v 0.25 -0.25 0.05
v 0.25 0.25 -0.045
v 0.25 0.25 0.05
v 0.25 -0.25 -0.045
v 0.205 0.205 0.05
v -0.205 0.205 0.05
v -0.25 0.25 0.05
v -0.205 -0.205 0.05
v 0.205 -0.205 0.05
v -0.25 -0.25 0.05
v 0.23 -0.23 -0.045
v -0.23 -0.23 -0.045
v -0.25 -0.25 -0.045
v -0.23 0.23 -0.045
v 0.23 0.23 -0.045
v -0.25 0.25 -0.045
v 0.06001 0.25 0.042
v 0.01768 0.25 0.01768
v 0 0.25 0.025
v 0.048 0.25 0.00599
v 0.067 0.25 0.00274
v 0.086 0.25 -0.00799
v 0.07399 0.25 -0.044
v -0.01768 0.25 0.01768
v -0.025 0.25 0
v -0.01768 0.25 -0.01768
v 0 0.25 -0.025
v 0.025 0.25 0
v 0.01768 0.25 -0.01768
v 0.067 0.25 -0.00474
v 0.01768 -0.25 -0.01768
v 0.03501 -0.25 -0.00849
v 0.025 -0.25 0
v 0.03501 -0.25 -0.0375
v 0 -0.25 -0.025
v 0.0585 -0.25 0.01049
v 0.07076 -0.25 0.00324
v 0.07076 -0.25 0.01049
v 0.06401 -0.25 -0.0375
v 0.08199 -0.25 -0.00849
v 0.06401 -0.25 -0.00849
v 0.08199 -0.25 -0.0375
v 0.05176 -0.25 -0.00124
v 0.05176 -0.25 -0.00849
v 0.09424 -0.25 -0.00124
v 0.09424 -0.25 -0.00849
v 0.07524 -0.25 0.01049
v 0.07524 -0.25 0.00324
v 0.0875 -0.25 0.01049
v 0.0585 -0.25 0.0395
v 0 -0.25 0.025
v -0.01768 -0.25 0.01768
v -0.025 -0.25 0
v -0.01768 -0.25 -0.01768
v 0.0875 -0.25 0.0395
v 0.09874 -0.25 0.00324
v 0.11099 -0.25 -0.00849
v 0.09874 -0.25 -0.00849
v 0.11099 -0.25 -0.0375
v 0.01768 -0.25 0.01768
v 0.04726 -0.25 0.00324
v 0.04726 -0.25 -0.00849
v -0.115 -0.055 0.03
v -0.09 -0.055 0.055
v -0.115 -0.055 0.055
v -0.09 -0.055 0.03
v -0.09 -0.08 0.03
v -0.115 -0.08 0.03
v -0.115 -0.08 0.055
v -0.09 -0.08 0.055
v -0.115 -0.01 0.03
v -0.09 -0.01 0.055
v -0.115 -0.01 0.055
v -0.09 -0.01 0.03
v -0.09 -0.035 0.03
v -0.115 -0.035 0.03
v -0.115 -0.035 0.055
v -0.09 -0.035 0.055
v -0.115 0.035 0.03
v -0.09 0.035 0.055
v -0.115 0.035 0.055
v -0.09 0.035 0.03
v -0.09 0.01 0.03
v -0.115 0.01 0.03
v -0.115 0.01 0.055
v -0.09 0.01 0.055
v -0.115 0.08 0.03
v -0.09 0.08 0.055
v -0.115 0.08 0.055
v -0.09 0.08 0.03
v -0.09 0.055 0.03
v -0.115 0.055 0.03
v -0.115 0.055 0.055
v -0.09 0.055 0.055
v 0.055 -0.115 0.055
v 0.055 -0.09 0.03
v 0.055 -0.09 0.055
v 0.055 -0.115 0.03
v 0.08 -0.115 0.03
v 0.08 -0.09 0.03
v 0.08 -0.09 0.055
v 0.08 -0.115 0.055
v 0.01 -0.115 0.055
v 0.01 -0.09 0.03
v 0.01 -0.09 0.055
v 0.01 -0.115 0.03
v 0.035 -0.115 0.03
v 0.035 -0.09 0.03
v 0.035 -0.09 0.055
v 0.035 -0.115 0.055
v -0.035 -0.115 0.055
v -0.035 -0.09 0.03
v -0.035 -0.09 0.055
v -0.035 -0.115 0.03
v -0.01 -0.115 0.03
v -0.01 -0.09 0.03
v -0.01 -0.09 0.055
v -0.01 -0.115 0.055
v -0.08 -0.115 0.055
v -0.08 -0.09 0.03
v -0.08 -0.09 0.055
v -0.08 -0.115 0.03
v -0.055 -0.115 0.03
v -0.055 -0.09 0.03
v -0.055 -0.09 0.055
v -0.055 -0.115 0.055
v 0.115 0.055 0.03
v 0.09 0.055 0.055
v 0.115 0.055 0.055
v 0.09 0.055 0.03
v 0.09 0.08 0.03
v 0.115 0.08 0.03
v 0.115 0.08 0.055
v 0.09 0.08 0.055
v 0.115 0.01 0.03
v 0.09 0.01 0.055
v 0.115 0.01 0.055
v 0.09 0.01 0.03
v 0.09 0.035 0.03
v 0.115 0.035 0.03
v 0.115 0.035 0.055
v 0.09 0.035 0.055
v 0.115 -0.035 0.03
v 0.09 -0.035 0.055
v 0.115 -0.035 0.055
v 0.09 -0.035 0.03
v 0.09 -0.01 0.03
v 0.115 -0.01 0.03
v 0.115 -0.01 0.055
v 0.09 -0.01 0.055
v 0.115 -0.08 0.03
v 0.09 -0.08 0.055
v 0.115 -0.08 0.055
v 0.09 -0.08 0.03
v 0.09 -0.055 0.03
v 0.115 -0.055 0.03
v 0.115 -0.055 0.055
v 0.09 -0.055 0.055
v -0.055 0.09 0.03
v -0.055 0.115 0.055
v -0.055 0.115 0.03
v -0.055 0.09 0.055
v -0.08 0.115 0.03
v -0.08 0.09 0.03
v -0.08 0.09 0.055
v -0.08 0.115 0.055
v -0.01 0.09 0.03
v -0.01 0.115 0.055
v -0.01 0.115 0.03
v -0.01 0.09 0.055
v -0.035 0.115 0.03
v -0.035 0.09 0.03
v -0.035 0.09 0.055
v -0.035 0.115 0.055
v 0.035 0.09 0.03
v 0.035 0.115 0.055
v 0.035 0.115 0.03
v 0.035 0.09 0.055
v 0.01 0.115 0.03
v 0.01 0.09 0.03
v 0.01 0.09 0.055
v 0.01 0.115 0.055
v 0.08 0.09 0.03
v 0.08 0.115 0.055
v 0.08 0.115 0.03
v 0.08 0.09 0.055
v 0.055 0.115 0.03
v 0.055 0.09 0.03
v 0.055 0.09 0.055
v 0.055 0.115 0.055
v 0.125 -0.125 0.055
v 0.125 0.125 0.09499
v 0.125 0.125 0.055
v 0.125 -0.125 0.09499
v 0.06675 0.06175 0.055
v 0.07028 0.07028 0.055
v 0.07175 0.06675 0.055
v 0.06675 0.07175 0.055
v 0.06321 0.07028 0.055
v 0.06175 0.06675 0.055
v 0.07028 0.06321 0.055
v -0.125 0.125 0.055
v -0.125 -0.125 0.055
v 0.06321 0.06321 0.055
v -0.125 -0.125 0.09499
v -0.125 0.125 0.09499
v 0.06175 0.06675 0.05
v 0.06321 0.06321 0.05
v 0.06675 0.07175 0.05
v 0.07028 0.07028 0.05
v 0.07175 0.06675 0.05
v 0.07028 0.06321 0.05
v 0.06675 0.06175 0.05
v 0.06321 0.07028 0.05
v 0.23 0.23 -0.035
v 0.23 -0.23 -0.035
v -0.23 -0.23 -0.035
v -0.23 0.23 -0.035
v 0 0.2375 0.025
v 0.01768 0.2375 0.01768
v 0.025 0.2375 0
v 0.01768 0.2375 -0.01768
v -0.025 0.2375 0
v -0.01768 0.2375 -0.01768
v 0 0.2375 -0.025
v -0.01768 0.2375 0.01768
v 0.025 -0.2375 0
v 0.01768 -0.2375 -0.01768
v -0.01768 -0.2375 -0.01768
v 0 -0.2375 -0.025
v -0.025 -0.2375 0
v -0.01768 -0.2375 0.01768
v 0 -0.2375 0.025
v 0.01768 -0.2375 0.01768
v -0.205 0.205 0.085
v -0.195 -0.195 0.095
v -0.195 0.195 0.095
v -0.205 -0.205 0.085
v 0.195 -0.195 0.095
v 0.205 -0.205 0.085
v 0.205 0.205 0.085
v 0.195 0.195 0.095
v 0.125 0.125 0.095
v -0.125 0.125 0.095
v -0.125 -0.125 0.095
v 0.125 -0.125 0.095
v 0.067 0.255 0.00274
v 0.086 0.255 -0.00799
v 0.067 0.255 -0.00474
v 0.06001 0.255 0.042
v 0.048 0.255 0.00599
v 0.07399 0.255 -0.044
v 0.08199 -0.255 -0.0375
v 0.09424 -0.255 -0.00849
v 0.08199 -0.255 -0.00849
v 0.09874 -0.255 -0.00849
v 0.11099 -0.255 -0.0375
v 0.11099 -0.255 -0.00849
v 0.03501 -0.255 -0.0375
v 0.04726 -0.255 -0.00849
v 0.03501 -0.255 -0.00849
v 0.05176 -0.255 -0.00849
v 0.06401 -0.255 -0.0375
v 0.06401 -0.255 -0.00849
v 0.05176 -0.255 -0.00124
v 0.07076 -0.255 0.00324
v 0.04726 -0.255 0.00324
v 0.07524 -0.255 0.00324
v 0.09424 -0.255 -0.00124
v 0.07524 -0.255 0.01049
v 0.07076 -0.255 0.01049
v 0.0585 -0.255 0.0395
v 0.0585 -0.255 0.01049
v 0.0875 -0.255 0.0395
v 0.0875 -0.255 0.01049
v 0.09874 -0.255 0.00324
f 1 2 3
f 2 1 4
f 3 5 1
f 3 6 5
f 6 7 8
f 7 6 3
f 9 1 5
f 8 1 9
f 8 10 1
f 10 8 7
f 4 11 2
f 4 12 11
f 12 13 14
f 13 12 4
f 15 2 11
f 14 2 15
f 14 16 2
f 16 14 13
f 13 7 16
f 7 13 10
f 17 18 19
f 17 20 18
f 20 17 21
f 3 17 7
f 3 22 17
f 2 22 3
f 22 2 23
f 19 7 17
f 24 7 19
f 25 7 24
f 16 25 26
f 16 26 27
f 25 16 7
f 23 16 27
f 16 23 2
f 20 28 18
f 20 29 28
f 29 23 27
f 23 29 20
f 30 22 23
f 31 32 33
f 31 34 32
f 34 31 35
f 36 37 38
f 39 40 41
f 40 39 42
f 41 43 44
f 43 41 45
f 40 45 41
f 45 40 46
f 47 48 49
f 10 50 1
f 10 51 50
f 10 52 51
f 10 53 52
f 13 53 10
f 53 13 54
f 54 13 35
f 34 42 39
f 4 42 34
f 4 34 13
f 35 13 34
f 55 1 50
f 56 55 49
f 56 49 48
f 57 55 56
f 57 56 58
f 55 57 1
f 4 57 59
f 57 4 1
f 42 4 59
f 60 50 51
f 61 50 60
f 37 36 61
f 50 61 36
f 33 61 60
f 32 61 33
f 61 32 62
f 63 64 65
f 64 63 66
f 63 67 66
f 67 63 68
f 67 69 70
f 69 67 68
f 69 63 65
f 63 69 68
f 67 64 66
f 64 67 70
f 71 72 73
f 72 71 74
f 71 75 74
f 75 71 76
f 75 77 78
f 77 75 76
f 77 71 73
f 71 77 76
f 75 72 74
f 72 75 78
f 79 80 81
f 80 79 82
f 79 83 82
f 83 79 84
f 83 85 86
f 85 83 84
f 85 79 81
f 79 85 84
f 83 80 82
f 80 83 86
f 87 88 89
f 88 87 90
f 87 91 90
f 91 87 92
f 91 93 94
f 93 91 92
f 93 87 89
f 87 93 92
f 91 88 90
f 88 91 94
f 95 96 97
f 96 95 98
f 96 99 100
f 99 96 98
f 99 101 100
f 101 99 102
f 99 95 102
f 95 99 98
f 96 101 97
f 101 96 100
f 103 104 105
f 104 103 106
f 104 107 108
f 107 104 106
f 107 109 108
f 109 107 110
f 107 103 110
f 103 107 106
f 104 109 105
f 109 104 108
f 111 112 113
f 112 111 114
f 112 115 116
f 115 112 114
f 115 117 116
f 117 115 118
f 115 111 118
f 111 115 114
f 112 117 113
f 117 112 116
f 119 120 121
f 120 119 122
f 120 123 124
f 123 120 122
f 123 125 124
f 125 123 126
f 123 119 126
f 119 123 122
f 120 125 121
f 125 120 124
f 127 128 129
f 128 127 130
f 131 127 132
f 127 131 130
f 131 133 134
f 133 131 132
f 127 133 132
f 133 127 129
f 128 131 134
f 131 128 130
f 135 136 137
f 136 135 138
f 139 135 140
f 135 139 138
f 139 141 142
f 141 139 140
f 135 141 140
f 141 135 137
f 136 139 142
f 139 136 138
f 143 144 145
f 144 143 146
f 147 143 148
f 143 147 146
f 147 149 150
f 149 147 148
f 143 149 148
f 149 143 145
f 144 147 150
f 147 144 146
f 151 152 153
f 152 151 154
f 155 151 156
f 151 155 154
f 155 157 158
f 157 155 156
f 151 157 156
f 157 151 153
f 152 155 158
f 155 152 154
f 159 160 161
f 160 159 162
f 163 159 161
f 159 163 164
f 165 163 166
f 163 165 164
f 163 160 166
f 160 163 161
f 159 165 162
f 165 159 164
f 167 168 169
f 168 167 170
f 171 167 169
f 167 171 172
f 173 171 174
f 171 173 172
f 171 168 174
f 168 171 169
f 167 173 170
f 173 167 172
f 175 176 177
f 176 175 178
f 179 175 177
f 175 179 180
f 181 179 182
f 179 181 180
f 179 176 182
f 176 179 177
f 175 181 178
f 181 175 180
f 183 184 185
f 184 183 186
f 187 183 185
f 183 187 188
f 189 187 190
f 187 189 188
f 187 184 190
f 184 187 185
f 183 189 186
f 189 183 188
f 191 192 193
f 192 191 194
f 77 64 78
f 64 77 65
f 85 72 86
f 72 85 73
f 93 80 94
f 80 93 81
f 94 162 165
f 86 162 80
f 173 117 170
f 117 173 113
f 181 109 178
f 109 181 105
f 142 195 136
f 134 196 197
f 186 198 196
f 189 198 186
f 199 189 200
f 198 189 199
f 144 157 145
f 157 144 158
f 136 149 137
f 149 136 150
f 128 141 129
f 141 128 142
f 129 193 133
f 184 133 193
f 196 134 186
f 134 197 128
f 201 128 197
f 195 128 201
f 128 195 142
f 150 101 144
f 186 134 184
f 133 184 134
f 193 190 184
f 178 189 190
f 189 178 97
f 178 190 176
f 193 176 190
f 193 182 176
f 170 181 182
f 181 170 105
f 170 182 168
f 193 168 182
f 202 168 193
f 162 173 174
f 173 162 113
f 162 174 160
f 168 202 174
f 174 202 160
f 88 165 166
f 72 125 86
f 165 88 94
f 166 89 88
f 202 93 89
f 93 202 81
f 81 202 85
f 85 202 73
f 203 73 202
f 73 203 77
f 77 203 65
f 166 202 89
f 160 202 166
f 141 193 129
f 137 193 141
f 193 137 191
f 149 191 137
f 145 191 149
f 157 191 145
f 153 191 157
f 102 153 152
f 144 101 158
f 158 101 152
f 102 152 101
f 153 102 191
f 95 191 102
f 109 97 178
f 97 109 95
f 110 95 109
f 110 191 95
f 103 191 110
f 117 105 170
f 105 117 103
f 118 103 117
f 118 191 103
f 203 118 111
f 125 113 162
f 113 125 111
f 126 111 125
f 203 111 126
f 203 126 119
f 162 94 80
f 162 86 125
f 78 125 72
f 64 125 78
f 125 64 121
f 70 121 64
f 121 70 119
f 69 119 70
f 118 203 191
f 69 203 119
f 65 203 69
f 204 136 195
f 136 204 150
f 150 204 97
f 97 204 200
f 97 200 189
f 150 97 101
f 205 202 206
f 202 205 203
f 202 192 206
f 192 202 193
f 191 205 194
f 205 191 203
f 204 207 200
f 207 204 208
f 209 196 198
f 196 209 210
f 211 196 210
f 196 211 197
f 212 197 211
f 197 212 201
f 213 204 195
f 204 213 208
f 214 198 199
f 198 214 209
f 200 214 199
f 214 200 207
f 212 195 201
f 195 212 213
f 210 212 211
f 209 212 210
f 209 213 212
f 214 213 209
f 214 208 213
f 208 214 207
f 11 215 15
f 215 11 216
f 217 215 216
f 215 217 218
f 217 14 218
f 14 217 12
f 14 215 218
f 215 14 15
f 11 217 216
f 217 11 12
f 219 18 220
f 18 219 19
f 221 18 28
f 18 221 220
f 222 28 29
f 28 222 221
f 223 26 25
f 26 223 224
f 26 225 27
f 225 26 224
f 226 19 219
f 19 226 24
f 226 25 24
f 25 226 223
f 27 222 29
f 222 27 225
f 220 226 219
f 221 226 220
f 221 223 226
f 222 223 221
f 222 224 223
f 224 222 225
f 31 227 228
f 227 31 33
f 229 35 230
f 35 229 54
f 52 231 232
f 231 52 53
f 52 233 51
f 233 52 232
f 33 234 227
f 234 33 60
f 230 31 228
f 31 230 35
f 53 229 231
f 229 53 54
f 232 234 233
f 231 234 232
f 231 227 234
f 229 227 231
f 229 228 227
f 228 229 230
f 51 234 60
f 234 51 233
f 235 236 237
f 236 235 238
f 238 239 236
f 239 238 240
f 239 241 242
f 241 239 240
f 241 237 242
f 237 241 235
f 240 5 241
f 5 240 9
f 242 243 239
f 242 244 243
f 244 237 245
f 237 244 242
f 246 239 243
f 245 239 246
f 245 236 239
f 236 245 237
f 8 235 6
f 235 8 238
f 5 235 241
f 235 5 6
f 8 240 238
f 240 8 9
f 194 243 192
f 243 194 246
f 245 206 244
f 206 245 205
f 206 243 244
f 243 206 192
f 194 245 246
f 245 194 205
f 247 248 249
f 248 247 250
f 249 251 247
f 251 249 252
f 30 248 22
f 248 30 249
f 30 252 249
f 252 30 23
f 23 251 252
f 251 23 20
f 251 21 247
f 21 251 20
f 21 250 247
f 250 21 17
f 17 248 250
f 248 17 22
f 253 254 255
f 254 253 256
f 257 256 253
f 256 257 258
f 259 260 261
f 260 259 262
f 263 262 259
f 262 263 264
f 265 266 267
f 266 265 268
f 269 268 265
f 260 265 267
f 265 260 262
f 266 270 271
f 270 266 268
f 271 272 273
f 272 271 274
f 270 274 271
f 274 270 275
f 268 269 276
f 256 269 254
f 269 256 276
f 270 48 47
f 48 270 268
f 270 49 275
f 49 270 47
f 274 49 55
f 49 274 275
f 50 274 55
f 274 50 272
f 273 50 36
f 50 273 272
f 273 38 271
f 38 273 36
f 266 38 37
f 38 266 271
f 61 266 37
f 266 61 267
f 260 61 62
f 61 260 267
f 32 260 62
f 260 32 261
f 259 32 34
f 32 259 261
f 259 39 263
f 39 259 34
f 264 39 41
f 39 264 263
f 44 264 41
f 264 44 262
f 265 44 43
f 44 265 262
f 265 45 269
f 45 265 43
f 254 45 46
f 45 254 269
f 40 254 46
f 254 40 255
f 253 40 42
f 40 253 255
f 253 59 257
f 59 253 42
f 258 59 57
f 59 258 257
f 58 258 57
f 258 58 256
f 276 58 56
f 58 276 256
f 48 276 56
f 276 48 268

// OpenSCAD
// file: FPGA_shared.scad
smallGridSize = 0.5;
baseSize = smallGridSize;
baseTop = 0.05;
baseBottom = -0.045;
baseDepth = baseTop - baseBottom;
baseCenter = (baseTop + baseBottom)/2;
baseBackRim = 0.02;
baseBackCutoutSize = baseSize - baseBackRim*2;
baseBackCutoutDepth = 0.01;
capSize = 0.41;
capDepth = 0.045;
capBevel = 0.01;
slotSize = smallGridSize * 0.5;
slotBottom = 0.03;
slotPinEdgeCount = 4;
slotPinEdgePad = 0.01;
slotPinEdgeSpacing = 0.045;
slotPinSize = 0.025;
slotPinDepth = 0.025;
eps = 0.00001;
chipTotalSize = slotSize - slotPinEdgePad*2 - slotPinSize/2;
chipTotalHeight = 0.1;
chipBaseHeight = 0.05;
pinHorizLength = 0.022;
pinHorizUnderLength = 0.008;
pinHorizWidth = 0.02;
pinHorizHeight = 0.015;
pinVertInnerOffset = 0.003;
pinVertOuterOffset = 0.003;
pinVertNarrowOffset = 0.003;
pinTotalHeight = chipTotalHeight - chipBaseHeight/2 + pinHorizHeight/2;
chipBaseSize = chipTotalSize - pinHorizLength*2;
chipBaseBevelSize = 0.005;
alignHoleRadius = 0.005;
alignHoleOffset = chipBaseSize/2 - 0.02;
alignHoleDepth = 0.005;
alignHoleSides = 8;

module cablecutout() {
  cableradius = 0.025;
  cableDepth = 0.0125;
  translate([0,smallGridSize/2,0]) rotate([90,0,0]) {
    cylinder(h=cableDepth*2, r=cableradius, center=true, $fn=8);
  }
}
// file: DataSymbol.scad
boxSize = 0.029;
lineSize = 0.0045;
symDepth = 0.01;
vertSeparation = 0.019;
horizSeparation = 0.018;

module DataSymbol() {
  boxVertCenter = (boxSize+vertSeparation)/2;
  boxHorizCenter = (boxSize+horizSeparation)/2;
  linear_extrude(symDepth, center=true) {
    translate([0,boxVertCenter]) square(boxSize, center=true); // top box
    translate([-boxHorizCenter,-boxVertCenter]) square(boxSize, center=true); // bottom left box
    translate([boxHorizCenter,-boxVertCenter]) square(boxSize, center=true); // bottom right box
    square([2*boxHorizCenter + lineSize, lineSize], center=true); // middle line
    translate([0, horizSeparation/4]) square([lineSize, horizSeparation/2 + lineSize], center=true); // line to top
    translate([-boxHorizCenter, -horizSeparation/4]) square([lineSize, horizSeparation/2 + lineSize], center=true); // line to bottom left
    translate([boxHorizCenter, -horizSeparation/4]) square([lineSize, horizSeparation/2 + lineSize], center=true); // line to bottom right
  }
}

DataSymbol();
// file: PowerSymbol.scad
symWidth = 0.038;
symHeight = 0.086;
symDepth = 0.01;
middleHeight = 0.0075;
topHorizOffset = 0.007;
sideVertOffset = 0.007;

module PowerSymbol() {
  linear_extrude(symDepth, center=true) {
    halfHei = symHeight/2;
    halfWid = symWidth/2;
    halfMid = middleHeight/2;
    polygon([
      [topHorizOffset, halfHei],
      [0, halfMid],
      [halfWid, sideVertOffset],
      [-topHorizOffset, -halfHei],
      [0, -halfMid],
      [-halfWid, -sideVertOffset]
    ]);
  }
}

PowerSymbol();
// file: BasicFPGAHousing_paintcap.scad
include <FPGA_shared.scad>;
use <BasicFPGAHousing_base.scad>;

module BasicFPGAHousing_paintcap() {
  bevelDepth = capBevel * sqrt(2);
  difference() {
    translate([0,0,baseTop]) {
      cube(size=[capSize, capSize, capDepth*2], center=true);
    }
    cube(size=[slotSize+eps, slotSize+eps, smallGridSize], center=true);
    for (edge=[1:4]) rotate([0,0,90*edge]) {
      translate([0,capSize/2,baseTop+capDepth]) rotate([45,0,0])
        cube(size=[capSize+0.1, bevelDepth, bevelDepth*2], center=true);
    }
  }
}

%BasicFPGAHousing_base();
BasicFPGAHousing_paintcap();
// file: BasicFPGAHousing_base.scad
include <FPGA_shared.scad>;
use <BasicFPGAHousing_paintcap.scad>;
use <PowerSymbol.scad>;
use <DataSymbol.scad>;

module BasiFPGAHousing_chipcutout() {
  slotPinBaseOffset = (-slotPinEdgeCount-1)/2 * slotPinEdgeSpacing;
  slotPinEdgeOffset = slotSize/2 - slotPinSize/2 - slotPinEdgePad;
  union() {
    translate([0, 0, baseDepth/2 + slotBottom + slotPinDepth]) {
      cube(size=[slotSize, slotSize, baseDepth], center=true);
    }
    for(edge=[1:4]) rotate([0,0,90*edge]) {
      for(i=[1:slotPinEdgeCount]) {
        translate([
          slotPinBaseOffset + slotPinEdgeSpacing*i,
          slotPinEdgeOffset,
          slotBottom + slotPinDepth
        ]) {
          cube(size=[slotPinSize, slotPinSize, slotPinDepth*2], center=true);
        }
      }
    }
    translate([alignHoleOffset,alignHoleOffset,slotBottom + slotPinDepth])
      cylinder(h=alignHoleDepth*2, r=alignHoleRadius, center=true, $fn=alignHoleSides);
  }
}

module BasicFPGAHousing_base() {
  middleSize = (slotSize + capSize) / 2;
  difference() {
    union() {
      translate([0,0,baseCenter])
        cube(size=[baseSize, baseSize, baseDepth], center=true);
      translate([0,0,baseTop-eps])
        cube(size=[middleSize, middleSize, capDepth*2], center=true);
    }
    translate([0,0,baseBottom])
      cube(size=[baseBackCutoutSize, baseBackCutoutSize, baseBackCutoutDepth*2], center=true);
    BasiFPGAHousing_chipcutout();
    cablecutout();
    rotate([0,0,180]) cablecutout();
  }
}

BasicFPGAHousing_base();
%BasicFPGAHousing_paintcap();
%translate([0.067,0.25,-0.001]) rotate([-90, 0, 0]) PowerSymbol();
%translate([0.073,-0.25,0.001]) rotate([90, 0, 0]) DataSymbol();
// main file
use <BasicFPGAHousing_base.scad>;
use <BasicFPGAHousing_paintcap.scad>;
use <PowerSymbol.scad>;
use <DataSymbol.scad>;

module BasicFPGAHousing_full() {
  BasicFPGAHousing_base();
  BasicFPGAHousing_paintcap();
  translate([0.067,0.25,-0.001]) rotate([-90, 0, 0]) PowerSymbol();
  translate([0.073,-0.25,0.001]) rotate([90, 0, 0]) DataSymbol();
}

BasicFPGAHousing_full();
